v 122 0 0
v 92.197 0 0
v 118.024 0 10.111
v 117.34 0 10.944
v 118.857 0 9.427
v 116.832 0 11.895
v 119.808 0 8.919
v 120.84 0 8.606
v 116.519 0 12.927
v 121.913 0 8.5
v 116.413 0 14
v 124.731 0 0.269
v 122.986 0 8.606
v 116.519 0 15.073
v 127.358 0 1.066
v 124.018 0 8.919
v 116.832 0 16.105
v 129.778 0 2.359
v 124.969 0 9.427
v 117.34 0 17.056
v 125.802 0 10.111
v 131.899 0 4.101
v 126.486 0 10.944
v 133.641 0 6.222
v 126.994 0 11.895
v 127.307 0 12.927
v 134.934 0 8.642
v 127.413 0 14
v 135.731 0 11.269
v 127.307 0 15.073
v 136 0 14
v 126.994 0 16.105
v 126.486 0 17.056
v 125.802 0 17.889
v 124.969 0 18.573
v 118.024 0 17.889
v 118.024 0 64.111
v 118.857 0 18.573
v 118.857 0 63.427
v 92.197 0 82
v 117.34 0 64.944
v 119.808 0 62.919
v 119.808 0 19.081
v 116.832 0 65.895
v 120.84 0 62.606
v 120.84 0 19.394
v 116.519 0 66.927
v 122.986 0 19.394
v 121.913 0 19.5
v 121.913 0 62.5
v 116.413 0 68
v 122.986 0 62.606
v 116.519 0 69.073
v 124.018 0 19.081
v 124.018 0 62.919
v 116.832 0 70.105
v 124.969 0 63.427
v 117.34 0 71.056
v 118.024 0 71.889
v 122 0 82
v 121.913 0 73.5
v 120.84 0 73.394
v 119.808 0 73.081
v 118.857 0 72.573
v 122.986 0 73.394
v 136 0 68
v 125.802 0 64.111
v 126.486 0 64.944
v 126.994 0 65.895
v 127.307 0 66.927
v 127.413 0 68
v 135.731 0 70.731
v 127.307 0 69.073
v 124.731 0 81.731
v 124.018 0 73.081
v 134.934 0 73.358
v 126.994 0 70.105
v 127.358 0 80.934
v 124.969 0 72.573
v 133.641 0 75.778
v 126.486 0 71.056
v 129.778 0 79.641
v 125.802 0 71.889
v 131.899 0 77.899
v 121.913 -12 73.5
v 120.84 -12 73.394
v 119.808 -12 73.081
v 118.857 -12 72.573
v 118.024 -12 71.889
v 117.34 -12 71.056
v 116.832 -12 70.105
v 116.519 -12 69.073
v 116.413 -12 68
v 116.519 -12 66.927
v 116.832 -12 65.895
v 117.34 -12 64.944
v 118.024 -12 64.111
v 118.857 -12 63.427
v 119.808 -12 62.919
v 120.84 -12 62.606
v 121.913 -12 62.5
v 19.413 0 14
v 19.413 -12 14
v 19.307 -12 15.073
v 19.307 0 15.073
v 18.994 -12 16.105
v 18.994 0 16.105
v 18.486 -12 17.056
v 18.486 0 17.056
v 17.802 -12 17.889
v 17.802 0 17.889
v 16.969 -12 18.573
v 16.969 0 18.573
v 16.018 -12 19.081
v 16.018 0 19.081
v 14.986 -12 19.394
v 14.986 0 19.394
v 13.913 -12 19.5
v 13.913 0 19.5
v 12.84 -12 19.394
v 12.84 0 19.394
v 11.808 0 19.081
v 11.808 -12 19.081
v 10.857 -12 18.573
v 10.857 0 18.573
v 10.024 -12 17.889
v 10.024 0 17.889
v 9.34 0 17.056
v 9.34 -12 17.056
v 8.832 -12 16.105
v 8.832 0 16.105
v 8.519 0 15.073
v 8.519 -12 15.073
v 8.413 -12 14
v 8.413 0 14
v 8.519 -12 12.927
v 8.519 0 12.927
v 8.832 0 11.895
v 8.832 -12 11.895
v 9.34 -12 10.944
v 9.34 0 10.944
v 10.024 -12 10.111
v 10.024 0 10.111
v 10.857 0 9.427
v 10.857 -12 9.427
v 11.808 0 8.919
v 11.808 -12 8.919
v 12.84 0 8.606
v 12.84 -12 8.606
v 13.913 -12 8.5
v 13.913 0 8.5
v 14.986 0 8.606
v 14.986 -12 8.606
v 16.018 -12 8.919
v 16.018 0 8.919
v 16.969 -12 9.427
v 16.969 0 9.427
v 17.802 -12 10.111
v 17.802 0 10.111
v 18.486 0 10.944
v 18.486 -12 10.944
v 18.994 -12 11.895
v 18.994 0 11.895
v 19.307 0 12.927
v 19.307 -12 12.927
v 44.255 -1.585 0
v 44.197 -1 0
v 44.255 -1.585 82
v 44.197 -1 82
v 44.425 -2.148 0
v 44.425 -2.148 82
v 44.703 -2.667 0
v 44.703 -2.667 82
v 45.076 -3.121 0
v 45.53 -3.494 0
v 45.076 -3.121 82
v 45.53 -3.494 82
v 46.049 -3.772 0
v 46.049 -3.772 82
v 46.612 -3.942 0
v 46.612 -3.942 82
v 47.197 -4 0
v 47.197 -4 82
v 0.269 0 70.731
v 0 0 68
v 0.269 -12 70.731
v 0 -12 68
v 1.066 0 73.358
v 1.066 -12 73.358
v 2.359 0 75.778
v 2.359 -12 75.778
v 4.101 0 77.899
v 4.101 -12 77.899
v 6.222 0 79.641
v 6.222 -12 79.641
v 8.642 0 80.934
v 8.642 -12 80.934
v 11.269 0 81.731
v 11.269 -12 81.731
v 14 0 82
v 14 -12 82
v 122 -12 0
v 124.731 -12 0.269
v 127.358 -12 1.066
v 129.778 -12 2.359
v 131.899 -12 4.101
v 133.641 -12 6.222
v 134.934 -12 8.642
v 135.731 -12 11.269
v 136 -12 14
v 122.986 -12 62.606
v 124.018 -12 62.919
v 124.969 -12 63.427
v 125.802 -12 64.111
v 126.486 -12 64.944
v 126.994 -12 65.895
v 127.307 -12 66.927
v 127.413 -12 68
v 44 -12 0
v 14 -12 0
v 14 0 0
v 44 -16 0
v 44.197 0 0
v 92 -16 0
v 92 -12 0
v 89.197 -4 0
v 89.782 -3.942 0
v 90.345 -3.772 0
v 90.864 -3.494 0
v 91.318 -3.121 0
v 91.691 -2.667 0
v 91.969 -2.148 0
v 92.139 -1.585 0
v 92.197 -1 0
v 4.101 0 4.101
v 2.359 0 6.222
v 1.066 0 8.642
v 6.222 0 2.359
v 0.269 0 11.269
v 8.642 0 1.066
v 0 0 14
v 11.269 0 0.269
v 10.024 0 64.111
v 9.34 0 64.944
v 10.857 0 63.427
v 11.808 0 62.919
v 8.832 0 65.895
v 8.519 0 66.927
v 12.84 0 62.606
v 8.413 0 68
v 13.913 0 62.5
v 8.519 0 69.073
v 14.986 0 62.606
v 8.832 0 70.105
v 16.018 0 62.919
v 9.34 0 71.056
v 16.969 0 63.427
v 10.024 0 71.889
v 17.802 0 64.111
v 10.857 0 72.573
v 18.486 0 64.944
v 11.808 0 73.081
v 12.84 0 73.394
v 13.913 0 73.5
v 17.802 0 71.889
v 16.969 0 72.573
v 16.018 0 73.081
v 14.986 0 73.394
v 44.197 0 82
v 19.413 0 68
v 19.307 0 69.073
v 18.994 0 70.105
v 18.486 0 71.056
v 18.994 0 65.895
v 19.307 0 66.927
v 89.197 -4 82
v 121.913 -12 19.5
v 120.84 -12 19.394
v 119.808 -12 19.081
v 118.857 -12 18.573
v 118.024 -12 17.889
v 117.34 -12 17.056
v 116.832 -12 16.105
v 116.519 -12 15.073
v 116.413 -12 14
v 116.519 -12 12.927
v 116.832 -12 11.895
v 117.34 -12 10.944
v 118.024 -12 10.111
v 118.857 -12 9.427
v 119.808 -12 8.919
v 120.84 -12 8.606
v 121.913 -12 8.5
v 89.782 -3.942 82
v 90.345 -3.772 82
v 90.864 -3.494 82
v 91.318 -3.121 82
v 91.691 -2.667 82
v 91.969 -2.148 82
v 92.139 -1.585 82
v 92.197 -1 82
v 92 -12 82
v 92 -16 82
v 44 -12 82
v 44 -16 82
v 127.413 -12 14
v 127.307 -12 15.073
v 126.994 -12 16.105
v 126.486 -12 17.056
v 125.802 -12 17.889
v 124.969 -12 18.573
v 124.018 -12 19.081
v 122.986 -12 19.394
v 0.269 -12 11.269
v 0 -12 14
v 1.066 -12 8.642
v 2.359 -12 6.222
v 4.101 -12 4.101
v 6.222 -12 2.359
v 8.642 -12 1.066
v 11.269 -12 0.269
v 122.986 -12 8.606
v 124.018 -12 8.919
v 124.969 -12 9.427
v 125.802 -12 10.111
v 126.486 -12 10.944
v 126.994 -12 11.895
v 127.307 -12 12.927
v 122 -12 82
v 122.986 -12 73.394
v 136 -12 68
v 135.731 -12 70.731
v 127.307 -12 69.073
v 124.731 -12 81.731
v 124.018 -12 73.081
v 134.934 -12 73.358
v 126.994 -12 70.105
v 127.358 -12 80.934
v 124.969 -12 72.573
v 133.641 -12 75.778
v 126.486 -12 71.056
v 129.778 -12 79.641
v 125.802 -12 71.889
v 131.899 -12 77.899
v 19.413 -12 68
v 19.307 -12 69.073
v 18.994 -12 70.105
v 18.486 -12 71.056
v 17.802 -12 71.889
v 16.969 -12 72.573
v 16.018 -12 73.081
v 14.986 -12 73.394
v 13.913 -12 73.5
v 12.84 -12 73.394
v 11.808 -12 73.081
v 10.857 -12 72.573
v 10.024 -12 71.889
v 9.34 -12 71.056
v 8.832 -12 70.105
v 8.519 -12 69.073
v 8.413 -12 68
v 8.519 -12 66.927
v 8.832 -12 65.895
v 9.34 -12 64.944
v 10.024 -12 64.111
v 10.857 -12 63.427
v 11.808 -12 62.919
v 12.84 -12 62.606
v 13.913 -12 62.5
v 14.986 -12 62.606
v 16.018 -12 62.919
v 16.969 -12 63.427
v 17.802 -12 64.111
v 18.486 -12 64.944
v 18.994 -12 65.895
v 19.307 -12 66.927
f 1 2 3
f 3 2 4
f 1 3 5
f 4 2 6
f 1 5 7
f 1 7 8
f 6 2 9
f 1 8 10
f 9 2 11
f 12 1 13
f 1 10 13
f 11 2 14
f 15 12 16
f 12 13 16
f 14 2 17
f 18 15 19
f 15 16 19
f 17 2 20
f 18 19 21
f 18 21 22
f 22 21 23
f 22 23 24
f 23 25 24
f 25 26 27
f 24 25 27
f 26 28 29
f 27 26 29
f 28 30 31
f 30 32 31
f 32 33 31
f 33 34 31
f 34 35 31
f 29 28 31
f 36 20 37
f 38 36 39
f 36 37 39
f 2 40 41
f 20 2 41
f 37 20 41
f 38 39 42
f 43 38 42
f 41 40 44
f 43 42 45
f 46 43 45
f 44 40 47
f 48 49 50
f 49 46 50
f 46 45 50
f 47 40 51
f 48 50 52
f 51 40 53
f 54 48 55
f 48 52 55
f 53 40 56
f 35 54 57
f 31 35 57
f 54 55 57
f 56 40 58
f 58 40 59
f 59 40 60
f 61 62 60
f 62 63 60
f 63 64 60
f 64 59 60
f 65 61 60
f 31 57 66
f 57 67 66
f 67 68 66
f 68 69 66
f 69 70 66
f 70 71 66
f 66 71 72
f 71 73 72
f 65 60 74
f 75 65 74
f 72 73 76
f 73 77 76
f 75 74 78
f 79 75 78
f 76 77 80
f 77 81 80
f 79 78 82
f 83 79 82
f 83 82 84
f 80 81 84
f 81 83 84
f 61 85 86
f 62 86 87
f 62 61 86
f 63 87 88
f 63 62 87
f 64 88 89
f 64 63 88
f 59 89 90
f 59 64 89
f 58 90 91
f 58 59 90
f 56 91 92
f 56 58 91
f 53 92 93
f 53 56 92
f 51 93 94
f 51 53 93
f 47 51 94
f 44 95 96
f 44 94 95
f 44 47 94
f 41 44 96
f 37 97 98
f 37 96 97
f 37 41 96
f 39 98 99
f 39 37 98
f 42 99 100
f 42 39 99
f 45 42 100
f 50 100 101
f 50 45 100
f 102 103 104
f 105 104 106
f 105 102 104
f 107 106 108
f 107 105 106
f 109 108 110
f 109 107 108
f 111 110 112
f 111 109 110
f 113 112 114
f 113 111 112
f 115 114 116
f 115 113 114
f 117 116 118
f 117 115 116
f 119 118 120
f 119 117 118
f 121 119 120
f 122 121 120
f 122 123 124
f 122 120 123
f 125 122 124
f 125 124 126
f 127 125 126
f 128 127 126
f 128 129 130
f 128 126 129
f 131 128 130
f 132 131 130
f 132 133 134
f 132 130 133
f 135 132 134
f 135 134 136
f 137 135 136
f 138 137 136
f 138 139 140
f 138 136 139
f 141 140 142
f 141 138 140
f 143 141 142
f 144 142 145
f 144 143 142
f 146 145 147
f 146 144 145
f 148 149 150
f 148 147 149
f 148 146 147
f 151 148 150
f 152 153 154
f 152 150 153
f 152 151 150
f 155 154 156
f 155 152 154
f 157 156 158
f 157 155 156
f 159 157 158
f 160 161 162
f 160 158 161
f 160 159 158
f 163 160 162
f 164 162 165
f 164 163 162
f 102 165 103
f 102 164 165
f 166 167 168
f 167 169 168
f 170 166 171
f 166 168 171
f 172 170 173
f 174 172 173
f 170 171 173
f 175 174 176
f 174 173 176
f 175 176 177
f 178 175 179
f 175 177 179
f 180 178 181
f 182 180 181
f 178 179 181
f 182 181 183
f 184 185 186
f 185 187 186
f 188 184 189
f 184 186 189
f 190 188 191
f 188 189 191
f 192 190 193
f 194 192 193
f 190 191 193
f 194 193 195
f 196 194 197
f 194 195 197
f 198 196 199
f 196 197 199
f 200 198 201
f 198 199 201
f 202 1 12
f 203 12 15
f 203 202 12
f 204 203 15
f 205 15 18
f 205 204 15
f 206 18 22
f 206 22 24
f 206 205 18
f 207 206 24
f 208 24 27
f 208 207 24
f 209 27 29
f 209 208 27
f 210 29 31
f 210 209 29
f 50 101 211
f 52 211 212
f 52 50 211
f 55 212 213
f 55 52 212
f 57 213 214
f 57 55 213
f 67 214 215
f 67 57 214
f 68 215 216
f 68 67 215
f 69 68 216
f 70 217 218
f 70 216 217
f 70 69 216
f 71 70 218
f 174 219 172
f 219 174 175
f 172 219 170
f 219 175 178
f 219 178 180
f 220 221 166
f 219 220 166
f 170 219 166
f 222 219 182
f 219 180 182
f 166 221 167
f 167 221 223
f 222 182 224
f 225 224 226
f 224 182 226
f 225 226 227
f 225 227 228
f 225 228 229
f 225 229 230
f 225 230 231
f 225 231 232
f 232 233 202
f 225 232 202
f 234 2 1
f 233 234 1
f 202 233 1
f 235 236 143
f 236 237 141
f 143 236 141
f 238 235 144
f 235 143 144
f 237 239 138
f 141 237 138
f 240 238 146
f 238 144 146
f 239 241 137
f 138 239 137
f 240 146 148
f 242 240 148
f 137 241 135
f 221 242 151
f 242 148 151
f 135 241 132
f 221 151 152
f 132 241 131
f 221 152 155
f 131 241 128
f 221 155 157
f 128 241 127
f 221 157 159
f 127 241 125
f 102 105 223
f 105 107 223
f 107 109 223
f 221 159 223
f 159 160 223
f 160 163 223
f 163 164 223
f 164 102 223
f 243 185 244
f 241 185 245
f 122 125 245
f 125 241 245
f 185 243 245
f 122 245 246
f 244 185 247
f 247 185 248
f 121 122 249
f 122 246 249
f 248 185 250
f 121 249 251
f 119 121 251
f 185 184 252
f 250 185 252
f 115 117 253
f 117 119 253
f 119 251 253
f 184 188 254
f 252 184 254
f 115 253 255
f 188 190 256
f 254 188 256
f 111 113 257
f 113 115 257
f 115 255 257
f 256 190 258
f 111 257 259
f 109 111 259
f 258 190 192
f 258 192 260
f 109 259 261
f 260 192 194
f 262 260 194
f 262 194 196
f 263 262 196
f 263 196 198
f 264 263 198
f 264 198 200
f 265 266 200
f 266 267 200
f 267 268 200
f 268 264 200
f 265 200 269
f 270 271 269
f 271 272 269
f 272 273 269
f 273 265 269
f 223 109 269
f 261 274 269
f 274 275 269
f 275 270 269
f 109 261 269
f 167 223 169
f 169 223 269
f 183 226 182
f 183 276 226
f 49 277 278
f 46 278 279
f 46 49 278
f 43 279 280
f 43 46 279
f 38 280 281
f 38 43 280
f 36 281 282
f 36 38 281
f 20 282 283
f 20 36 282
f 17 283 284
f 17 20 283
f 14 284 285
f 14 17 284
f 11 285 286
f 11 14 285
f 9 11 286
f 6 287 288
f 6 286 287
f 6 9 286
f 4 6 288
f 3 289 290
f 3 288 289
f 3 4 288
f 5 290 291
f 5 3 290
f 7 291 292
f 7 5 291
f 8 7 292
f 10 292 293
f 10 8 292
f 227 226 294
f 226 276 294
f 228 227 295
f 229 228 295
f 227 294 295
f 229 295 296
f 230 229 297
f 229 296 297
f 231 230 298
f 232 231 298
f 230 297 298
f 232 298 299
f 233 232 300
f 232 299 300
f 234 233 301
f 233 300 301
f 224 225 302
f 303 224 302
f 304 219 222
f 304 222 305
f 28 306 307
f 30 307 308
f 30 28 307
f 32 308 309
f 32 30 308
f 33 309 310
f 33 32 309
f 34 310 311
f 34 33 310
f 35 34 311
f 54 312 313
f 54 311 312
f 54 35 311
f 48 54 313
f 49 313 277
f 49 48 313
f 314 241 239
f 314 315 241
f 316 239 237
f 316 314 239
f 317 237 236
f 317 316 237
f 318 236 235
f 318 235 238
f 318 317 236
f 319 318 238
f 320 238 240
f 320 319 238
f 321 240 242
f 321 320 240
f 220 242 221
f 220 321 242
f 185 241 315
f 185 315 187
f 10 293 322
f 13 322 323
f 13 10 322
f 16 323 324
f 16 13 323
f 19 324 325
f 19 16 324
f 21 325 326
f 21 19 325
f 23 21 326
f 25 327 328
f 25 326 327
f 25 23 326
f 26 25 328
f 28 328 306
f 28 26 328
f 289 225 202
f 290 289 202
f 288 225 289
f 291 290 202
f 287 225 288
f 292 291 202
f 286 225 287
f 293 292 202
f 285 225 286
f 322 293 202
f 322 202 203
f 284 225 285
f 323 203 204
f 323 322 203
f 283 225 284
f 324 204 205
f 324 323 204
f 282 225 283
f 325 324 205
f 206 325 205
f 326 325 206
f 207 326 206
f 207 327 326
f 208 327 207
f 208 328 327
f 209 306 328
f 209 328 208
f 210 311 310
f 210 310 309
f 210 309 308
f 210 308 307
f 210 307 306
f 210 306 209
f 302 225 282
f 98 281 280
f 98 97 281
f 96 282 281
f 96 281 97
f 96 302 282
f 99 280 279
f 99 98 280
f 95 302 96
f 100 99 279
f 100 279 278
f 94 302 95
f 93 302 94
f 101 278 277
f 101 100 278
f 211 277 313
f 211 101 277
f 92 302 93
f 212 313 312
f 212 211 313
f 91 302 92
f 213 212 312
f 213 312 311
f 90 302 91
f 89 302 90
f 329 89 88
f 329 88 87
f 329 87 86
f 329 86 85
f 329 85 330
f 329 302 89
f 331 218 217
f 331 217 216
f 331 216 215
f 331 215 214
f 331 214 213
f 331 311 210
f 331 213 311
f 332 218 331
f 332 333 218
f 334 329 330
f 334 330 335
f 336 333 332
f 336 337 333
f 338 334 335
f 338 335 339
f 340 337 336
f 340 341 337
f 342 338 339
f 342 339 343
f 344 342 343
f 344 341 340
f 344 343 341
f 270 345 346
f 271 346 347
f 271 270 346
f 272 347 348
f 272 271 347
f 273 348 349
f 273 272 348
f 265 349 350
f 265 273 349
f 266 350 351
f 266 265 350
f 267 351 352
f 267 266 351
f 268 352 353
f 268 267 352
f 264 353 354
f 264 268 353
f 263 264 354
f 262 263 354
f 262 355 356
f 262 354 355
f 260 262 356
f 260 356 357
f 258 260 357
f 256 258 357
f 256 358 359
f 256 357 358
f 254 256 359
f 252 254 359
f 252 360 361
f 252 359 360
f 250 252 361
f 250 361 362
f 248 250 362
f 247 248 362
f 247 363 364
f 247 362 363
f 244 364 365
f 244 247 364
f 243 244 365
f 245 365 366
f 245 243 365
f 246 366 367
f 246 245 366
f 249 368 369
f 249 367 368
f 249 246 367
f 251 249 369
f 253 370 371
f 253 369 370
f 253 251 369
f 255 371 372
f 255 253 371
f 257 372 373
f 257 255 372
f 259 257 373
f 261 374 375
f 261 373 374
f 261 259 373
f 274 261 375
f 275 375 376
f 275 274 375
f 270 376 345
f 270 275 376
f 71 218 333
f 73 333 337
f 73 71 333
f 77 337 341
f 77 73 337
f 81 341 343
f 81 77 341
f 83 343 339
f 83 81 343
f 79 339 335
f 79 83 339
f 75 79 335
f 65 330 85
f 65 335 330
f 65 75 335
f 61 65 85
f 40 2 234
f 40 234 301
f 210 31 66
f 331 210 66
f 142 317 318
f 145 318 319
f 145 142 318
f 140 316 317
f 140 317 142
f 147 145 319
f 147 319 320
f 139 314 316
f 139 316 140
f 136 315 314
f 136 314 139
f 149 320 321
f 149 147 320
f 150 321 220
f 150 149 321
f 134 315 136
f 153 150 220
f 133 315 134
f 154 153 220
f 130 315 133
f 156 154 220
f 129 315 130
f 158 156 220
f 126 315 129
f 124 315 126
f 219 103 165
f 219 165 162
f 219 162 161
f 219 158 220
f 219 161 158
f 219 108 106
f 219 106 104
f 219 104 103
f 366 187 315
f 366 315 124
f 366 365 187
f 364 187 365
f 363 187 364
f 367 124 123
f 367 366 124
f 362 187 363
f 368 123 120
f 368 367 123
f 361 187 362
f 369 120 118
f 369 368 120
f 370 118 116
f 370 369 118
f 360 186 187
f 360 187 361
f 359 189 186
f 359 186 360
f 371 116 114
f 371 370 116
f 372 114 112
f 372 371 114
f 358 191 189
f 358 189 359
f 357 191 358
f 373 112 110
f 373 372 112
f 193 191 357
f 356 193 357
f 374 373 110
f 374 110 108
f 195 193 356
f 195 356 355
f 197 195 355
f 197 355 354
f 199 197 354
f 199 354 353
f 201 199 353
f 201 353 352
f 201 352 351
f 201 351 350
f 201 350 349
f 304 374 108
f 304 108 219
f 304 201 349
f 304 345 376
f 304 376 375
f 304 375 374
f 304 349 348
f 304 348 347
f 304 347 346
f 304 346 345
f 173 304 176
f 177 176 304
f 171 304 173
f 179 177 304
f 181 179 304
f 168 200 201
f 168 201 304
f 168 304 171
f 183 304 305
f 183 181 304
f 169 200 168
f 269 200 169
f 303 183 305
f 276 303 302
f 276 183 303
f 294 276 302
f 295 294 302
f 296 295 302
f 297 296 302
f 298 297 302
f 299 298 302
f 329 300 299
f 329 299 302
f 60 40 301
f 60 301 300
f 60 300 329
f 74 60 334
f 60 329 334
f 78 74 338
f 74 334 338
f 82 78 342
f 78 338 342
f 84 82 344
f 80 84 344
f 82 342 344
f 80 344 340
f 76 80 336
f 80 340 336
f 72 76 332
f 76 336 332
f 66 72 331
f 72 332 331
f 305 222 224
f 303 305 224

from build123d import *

# Parameters (mm, degrees)
F0_W     = 136
F0_H     = 82
F1_DEPTH = 12
F2_W     = 48
F2_H     = 82
F3_DEPTH = 4
F4_W     = 48
F4_H     = 82
F5_DEPTH = 4
F6_R     = 14
F7_R     = 5.5
F8_DEPTH = 16.001
F9_R     = 3


with BuildPart() as f1:
    # F0 (on Front) → F1 (new body)
    with BuildSketch(Plane.XZ):
        with Locations((68, 41)):
            Rectangle(F0_W, F0_H)
    extrude(amount=F1_DEPTH)

    # F2 (on face) → F3 (join)
    with BuildSketch(Plane.XZ.offset(12)):
        with Locations((68, 41)):
            Rectangle(F2_W, F2_H)
    extrude(amount=F3_DEPTH)

    # F4 (on face) → F5 (cut)
    with BuildSketch(Plane(origin=(0, 0, 0), x_dir=(-1, 0, 0), z_dir=(0, 1, 0))):
        with Locations((-68.19709, 41)):
            Rectangle(F4_W, F4_H)
    extrude(amount=-F5_DEPTH, mode=Mode.SUBTRACT)

    # F6
    f6_edges = [f1.edges().sort_by_distance(p)[0] for p in [
        (136, -6, 82),
        (0, -6, 82),
        (136, -6, 0),
        (0, -6, 0),
    ]]
    fillet(f6_edges, radius=F6_R)

    # F7 (on Front) → F8 (cut, through all)
    with BuildSketch(Plane.XZ):
        with BuildLine():
            Line((121.913074, 62.5), (121.913074, 73.5))
            ThreePointArc((121.913074, 73.5), (116.413074, 68), (121.913074, 62.5))
        make_face()
        with BuildLine():
            ThreePointArc((127.413074, 68), (125.802162, 71.889087), (121.913074, 73.5))
            Line((121.913074, 73.5), (121.913074, 62.5))
            ThreePointArc((121.913074, 62.5), (125.802162, 64.110913), (127.413074, 68))
        make_face()
        with BuildLine():
            ThreePointArc((127.413074, 14), (125.802162, 17.889087), (121.913074, 19.5))
            Line((121.913074, 19.5), (121.913074, 8.5))
            ThreePointArc((121.913074, 8.5), (125.802162, 10.110913), (127.413074, 14))
        make_face()
        with BuildLine():
            Line((121.913074, 8.5), (121.913074, 19.5))
            ThreePointArc((121.913074, 19.5), (116.413074, 14), (121.913074, 8.5))
        make_face()
        with Locations((13.913074, 14)):
            Circle(F7_R)
        with Locations((13.913074, 68)):
            Circle(F7_R)
    extrude(amount=F8_DEPTH, mode=Mode.SUBTRACT)

    # F9
    f9_edges = [f1.edges().sort_by_distance(p)[0] for p in [
        (92.19709, -4, 41),
        (44.19709, -4, 41),
    ]]
    fillet(f9_edges, radius=F9_R)


solid = f1.part
